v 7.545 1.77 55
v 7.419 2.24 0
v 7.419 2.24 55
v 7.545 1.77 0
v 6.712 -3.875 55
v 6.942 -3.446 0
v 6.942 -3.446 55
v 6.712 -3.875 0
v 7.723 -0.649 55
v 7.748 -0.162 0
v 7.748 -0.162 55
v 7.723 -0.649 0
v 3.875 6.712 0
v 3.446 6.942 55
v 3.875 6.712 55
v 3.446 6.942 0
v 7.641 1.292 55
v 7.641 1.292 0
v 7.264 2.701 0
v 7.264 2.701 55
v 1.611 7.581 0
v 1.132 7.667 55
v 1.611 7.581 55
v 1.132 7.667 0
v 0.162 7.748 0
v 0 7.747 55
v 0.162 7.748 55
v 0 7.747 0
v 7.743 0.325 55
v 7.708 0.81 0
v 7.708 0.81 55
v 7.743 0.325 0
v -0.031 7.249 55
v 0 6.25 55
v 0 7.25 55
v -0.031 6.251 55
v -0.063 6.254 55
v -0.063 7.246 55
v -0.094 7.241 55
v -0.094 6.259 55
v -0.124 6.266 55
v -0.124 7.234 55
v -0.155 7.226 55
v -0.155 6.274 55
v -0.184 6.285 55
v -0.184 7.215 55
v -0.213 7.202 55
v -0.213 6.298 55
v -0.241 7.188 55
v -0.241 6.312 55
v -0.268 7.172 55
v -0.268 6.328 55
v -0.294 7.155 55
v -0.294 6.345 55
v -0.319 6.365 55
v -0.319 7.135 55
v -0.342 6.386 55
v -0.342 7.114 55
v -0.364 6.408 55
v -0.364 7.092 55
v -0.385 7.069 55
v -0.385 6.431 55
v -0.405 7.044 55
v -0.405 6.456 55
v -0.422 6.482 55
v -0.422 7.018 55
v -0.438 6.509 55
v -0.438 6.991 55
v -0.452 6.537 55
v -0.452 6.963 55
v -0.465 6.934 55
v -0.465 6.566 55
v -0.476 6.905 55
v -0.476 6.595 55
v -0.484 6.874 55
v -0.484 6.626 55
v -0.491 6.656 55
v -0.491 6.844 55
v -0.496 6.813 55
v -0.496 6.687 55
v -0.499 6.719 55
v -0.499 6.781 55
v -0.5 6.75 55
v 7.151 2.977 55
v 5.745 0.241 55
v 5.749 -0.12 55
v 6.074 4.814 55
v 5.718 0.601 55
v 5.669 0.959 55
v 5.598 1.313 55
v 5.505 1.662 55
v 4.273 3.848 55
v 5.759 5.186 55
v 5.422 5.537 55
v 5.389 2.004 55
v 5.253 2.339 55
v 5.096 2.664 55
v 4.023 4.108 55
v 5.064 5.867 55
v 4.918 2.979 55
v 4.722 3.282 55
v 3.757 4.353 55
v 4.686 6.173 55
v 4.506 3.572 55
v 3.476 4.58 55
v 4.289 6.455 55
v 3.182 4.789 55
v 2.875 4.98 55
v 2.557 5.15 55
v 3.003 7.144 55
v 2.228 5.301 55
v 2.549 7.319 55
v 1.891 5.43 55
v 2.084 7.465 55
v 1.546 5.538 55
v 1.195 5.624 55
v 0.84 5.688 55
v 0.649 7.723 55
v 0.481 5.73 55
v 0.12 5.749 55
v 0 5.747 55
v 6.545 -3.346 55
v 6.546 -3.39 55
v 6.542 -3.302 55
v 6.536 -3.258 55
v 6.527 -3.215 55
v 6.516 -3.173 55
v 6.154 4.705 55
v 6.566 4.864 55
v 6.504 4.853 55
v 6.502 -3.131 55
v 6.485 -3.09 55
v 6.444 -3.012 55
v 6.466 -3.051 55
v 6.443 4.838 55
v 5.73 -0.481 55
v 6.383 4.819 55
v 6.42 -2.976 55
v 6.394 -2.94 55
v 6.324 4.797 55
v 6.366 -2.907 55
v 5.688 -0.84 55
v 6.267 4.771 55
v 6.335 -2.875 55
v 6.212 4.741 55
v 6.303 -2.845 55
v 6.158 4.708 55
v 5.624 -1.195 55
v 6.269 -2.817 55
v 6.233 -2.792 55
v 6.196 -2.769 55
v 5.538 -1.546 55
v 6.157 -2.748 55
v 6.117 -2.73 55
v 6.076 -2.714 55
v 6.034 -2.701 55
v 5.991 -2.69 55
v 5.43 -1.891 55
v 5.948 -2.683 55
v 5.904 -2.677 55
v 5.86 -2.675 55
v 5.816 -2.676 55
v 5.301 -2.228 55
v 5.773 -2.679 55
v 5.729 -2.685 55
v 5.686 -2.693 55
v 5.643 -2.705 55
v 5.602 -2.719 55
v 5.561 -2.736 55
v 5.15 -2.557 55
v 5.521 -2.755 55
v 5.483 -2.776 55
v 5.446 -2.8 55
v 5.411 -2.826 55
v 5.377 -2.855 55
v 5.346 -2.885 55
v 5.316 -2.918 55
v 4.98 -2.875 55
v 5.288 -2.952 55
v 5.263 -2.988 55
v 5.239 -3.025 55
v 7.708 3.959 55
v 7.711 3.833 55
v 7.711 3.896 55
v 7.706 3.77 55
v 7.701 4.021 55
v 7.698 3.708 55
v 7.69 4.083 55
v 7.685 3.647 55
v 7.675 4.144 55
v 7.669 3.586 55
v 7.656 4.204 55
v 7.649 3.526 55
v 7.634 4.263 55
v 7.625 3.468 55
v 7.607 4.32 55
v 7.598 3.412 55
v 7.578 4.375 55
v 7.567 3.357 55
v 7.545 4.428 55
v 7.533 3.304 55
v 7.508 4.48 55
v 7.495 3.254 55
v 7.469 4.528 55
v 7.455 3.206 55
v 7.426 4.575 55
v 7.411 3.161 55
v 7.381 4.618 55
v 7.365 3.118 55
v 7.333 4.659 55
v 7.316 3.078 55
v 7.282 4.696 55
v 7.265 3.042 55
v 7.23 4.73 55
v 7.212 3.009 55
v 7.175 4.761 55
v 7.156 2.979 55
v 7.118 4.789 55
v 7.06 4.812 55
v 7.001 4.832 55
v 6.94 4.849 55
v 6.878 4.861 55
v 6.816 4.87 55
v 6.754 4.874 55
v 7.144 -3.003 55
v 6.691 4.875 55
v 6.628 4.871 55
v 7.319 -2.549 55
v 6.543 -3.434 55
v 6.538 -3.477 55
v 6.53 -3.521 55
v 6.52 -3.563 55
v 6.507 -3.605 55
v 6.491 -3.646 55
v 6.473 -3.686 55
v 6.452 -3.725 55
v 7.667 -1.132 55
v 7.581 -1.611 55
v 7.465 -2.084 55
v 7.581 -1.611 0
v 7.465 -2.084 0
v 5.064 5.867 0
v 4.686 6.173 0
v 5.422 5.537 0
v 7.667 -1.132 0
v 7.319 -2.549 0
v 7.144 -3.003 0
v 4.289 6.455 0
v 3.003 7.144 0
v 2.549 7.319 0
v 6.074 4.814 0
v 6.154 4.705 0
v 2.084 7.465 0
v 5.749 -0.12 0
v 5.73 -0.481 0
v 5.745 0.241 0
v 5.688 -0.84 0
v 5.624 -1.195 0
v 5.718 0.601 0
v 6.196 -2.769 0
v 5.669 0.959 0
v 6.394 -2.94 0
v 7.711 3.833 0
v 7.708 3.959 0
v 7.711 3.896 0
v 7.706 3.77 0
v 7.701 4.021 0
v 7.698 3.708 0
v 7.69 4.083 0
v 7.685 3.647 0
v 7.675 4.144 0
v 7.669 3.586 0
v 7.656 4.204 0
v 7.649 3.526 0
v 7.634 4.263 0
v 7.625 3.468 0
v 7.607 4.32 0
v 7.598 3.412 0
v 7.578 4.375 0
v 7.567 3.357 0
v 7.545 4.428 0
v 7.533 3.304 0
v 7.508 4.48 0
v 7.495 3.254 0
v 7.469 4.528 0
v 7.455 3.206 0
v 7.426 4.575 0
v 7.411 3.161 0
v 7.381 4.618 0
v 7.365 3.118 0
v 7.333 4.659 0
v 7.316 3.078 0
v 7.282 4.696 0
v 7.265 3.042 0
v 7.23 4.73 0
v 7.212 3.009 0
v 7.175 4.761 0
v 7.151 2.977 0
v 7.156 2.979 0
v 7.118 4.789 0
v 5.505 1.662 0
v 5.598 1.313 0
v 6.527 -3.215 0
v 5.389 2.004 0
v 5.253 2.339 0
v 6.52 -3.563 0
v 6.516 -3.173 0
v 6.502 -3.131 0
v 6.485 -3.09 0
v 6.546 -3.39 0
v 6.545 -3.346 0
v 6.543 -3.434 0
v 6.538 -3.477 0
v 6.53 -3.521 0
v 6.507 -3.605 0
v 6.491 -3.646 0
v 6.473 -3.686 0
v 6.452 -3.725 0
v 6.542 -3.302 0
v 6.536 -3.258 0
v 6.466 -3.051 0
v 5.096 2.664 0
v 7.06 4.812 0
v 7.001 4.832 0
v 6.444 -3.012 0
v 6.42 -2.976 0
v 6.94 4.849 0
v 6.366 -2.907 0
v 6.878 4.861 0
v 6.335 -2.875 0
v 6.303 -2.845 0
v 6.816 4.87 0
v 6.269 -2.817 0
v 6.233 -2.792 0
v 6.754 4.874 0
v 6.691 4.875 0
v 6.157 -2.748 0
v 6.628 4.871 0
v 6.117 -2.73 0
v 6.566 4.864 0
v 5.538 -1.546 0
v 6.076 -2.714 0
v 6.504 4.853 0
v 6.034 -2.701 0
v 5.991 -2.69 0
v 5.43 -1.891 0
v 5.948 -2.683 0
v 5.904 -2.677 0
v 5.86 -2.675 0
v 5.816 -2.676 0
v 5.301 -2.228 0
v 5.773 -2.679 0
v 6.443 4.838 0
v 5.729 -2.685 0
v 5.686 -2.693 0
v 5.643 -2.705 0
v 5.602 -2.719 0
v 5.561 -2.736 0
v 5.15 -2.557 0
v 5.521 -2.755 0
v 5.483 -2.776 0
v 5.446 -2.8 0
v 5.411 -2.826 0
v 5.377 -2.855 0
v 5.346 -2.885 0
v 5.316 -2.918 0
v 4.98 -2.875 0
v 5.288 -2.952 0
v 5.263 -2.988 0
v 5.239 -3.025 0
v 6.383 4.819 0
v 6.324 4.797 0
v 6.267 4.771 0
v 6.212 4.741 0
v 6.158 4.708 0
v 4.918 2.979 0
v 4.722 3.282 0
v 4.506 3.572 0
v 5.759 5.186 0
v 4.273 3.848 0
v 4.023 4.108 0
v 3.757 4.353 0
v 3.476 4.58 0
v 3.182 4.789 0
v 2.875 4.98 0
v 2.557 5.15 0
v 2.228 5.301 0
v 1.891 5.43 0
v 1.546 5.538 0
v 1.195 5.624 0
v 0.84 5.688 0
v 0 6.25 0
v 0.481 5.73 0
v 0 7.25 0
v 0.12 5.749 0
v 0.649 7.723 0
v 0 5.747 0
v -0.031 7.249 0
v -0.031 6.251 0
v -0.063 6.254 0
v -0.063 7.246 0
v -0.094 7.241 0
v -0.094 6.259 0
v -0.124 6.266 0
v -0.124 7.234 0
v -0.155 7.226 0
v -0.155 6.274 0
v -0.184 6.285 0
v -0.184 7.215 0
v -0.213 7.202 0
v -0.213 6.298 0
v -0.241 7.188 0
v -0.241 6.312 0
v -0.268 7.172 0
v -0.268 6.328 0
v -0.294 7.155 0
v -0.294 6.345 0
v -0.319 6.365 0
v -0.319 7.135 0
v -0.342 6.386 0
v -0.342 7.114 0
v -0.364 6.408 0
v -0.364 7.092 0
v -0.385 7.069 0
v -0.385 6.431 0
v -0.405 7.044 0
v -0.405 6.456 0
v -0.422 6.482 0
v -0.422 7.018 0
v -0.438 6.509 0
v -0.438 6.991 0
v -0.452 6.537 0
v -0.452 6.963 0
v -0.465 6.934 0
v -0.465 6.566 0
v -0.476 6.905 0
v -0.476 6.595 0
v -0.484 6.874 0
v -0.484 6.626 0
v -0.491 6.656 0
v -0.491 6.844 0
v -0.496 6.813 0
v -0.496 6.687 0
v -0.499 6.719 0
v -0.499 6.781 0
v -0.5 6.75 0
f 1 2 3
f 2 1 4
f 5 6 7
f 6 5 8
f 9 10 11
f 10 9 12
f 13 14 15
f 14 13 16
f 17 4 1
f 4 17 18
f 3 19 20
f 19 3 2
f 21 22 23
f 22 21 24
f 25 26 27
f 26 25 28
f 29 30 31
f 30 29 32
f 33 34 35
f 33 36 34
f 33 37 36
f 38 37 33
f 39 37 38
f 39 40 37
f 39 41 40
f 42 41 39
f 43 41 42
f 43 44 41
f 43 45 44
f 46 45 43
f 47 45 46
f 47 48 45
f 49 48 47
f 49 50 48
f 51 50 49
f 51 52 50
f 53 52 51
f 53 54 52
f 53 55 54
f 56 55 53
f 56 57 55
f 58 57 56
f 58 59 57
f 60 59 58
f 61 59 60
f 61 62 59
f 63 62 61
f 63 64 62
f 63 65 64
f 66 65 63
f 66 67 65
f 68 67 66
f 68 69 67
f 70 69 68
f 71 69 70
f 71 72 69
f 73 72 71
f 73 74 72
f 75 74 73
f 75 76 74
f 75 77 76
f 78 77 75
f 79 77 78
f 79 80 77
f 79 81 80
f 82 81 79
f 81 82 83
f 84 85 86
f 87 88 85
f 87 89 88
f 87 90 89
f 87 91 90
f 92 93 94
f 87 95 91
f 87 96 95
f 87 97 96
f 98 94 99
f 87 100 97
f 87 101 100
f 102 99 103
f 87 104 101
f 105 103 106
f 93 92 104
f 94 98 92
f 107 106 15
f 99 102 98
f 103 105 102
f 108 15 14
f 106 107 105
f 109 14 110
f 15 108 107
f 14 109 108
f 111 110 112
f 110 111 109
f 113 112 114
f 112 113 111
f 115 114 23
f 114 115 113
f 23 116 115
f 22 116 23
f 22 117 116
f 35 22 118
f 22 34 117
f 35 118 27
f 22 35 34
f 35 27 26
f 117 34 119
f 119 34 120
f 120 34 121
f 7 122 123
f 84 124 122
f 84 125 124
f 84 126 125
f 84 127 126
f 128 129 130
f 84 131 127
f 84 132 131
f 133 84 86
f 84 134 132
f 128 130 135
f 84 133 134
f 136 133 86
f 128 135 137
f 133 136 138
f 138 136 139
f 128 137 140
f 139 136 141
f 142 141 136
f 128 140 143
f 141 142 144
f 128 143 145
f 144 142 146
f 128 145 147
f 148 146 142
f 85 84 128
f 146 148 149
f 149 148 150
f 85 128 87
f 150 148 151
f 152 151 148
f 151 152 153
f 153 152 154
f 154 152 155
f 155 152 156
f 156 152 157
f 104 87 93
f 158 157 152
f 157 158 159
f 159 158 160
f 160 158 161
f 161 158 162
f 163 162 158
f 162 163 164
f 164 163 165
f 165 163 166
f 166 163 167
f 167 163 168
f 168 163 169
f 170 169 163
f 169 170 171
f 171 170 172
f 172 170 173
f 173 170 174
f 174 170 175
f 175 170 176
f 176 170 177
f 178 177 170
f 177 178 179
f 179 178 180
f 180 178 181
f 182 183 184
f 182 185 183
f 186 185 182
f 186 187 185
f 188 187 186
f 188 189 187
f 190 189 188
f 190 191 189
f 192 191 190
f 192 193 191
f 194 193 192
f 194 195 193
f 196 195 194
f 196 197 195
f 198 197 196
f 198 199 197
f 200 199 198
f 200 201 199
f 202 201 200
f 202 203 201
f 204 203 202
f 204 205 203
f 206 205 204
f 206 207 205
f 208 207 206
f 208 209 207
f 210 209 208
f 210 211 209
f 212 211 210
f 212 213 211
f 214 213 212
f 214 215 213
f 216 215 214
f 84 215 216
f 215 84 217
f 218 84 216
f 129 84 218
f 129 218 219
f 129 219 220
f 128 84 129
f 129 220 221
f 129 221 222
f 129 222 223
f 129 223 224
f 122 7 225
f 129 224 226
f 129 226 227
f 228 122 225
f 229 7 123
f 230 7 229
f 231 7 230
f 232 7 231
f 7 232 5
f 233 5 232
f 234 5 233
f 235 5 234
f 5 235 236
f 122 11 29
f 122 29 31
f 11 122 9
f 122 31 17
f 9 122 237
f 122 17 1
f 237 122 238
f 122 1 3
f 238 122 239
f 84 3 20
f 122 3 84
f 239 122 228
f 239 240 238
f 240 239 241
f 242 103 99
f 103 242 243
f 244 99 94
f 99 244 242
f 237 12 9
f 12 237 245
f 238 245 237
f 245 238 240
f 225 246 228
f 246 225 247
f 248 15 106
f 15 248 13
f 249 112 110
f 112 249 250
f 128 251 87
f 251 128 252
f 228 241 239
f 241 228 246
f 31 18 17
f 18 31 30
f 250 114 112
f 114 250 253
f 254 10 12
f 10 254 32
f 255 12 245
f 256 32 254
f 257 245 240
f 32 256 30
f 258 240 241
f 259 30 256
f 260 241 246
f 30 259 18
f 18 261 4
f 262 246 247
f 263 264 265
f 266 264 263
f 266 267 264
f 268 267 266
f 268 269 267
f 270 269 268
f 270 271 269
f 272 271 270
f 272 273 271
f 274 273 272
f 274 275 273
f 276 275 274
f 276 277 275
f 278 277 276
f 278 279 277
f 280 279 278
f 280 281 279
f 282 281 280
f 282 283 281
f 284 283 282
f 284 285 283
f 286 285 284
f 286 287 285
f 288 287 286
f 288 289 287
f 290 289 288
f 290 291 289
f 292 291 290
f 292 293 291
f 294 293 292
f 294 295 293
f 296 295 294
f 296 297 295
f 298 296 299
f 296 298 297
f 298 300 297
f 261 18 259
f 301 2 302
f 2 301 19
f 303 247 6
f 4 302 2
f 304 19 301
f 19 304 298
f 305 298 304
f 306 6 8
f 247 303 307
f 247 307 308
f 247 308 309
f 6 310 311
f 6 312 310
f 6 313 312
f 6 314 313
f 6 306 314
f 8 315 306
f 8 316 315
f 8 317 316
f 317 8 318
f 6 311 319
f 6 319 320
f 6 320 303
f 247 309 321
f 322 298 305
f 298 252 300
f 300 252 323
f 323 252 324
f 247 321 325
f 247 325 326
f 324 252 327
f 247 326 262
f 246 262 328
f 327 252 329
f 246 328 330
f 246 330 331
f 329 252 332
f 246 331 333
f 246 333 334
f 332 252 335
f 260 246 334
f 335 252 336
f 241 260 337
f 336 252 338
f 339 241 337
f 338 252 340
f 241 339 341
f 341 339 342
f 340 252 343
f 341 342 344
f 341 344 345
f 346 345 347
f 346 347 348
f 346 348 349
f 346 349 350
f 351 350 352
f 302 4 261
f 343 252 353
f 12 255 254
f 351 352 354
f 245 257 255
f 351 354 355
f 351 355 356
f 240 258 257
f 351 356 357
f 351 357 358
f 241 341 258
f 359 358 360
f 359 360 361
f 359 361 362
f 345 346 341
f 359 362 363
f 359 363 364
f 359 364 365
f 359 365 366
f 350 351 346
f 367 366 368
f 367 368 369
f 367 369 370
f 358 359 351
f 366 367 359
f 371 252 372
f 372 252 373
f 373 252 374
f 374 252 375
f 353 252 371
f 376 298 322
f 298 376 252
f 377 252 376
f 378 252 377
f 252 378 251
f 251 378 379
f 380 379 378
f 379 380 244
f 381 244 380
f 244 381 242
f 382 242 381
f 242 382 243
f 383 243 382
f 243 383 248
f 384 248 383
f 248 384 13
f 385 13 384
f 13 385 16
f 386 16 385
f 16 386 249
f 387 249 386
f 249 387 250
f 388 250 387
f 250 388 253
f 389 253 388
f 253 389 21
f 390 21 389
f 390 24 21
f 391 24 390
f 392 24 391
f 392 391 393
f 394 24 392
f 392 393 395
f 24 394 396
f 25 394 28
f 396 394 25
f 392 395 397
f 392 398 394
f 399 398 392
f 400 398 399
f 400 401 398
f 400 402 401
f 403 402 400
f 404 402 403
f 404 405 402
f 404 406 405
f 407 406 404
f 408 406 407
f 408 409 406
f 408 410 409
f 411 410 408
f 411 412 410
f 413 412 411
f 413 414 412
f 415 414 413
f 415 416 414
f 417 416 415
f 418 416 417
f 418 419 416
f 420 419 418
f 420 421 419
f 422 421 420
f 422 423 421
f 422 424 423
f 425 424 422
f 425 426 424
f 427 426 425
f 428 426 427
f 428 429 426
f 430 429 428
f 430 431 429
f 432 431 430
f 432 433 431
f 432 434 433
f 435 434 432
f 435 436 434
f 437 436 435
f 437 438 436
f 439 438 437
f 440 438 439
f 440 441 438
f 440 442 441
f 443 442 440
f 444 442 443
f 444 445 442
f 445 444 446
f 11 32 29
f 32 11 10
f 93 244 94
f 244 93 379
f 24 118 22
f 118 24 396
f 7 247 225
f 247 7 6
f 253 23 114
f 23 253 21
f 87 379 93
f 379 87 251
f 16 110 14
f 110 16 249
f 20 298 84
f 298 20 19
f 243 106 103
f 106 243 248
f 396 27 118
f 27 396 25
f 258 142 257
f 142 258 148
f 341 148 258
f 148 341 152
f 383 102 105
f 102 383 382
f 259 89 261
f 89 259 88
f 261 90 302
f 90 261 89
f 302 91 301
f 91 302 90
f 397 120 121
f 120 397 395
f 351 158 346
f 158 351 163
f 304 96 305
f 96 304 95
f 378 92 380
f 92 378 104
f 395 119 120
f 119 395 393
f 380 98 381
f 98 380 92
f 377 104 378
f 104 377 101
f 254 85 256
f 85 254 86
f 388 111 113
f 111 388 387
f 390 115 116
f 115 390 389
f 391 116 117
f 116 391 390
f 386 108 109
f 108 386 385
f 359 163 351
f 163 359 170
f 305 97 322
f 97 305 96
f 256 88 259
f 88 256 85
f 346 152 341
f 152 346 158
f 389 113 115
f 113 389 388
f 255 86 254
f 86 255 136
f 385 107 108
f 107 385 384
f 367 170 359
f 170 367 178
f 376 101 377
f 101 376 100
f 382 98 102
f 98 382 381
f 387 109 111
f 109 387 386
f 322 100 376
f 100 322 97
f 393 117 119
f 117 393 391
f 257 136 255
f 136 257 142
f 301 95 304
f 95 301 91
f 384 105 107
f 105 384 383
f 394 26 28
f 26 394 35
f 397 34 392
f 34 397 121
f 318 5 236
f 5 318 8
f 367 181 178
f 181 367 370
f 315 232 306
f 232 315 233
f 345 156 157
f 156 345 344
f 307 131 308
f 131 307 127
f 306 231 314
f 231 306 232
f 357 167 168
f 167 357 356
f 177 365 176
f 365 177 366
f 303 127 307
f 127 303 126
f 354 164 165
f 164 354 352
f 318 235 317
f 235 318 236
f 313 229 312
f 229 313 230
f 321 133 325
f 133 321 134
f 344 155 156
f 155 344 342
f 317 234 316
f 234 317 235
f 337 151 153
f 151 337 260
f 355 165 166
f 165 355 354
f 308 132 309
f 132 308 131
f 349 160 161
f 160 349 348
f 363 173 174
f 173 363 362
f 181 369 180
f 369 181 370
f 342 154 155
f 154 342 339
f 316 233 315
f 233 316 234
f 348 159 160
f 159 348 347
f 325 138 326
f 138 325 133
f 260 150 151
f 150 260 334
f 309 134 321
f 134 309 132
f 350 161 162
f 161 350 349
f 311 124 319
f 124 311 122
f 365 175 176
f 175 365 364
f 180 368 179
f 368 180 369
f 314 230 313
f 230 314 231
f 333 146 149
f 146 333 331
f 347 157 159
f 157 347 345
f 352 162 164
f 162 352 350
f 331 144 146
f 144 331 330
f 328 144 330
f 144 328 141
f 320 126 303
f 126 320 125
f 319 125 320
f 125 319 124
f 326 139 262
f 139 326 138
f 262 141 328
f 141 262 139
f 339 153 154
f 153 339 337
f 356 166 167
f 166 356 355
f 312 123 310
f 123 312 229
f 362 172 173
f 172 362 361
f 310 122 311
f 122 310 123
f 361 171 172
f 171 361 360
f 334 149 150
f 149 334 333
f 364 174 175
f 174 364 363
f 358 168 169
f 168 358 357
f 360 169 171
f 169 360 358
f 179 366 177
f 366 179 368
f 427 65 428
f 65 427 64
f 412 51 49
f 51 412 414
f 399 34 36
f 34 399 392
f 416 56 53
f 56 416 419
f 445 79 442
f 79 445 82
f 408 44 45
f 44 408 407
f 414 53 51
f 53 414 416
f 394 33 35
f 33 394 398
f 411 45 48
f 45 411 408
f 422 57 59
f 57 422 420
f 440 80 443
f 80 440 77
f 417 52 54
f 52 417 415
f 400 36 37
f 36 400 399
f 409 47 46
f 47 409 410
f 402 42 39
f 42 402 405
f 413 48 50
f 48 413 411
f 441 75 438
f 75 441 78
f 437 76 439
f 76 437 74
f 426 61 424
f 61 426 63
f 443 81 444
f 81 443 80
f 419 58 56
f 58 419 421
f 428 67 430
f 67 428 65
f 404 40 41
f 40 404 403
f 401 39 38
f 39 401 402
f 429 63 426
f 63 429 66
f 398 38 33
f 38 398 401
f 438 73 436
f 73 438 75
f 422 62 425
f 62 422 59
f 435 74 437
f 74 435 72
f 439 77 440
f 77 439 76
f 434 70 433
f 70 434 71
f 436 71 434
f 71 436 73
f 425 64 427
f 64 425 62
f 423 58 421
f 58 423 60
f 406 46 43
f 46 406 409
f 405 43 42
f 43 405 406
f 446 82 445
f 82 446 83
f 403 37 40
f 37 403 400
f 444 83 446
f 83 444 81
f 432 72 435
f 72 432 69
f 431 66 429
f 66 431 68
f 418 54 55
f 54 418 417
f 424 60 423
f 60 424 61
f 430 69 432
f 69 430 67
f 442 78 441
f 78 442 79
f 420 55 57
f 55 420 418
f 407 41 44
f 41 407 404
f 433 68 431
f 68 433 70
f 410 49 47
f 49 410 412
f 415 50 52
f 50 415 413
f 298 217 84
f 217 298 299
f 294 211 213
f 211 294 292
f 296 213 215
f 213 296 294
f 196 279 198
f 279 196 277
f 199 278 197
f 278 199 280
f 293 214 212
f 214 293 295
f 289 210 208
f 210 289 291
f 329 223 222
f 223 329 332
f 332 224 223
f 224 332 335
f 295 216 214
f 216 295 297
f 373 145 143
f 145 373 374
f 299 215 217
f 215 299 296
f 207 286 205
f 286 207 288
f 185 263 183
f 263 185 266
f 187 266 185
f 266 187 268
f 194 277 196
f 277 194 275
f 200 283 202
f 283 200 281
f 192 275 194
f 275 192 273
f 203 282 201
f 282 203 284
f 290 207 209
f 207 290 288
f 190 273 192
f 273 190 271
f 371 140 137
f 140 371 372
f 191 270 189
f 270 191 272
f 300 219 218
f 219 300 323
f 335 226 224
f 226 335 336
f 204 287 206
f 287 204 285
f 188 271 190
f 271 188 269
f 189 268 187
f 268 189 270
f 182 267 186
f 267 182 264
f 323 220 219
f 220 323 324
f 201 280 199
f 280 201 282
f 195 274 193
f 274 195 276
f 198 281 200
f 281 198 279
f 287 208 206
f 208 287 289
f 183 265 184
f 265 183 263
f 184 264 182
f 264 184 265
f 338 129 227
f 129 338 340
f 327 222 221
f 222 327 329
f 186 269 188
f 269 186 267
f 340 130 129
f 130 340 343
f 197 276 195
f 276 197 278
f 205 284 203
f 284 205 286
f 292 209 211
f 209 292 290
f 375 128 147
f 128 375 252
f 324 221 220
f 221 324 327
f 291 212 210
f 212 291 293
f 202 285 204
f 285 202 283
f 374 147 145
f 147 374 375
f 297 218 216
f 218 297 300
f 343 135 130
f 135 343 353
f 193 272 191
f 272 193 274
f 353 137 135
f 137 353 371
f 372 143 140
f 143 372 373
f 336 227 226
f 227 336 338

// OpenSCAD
// PARAMETRES

// MODULE
rayon_module = 5.75;
hauteur = 50+5;
rayon_chambre = 0.75;
rayon_canule = 0.75;
rayon_lumen = 2.25;
dec = 6; // longueur d'un coté du triangle équilatéral
//dec_y = rayon_module/6;
e = 3.5; //écartement entre deux paires de trous

// MOULE
e_mold = 2; // epaisseur du moule en mm
mold_radius = rayon_module + e_mold;
mold_canula = 0.5; // pour coincer les pièces entre elles (rayon)
mold_support = 1; // pour coincer le moule dans le support (rayon)

marge = 0.2; // écart en mm du rayon des pièces pour qu'elles puissent s'imbriquer entre elles
// ajout des marges sur les trous pour l'instant

$fn = 100; // permet de déterminer le nb de face, et donc la résolution des surfaces arrondies !

dec_x = dec*sin(60);  // décalage appliqués pour qu'ils soient bien placé en triangle
dec_y = dec*cos(60);

A_x = dec_x;
A_y = 0;

B_x = 0;
B_y = dec_y;

C_x = 0;
C_y = -dec_y;

A1_x = A_x;
A2_x = A_x;
A1_y = A_y - e/2;
A2_y = A_y + e/2;

B1_x = B_x - (e/2)*sin(60);
B2_x = B_x + (e/2)*sin(60);
B1_y = B_y - (e/2)*cos(60);
B2_y = B_y + (e/2)*cos(60);

C1_x = C_x + (e/2)*sin(60);
C2_x = C_x - (e/2)*sin(60);
C1_y = C_y - (e/2)*cos(60);
C2_y = C_y + (e/2)*cos(60);


// determine la valeur de la translation appliqué de bas à tous les trous
t_x = -(dec/2)*tan(30); // décalage pour centrer le triangle dans le cercle
t_y = 0;
t_z = 1;

t_z_l = -1; // translation initiale du lumen

// FIN DES PARAME7TRES

//cylinder(hauteur, rayon_module, rayon_module); // Crée la forme générale du robot



/*
translate([0,mold_radius-e_mold/2,0]){
cylinder(hauteur,mold_canula,mold_canula);
}*/



//rotate([0,0,0]){ // pour le 1er # 003
//rotate([0,0,120]){ // pour le 2nd # 003
rotate([0,0,240]){ // pour le 2nd # 003

union(){ // #002

difference(){ // #001

intersection(){

difference(){
    cylinder(hauteur, mold_radius, mold_radius);
    translate([0,0,t_z_l]){
cylinder(hauteur+2, rayon_module, rayon_module); // Crée la forme //générale du robot
    }
} // Cree le moule cylindrique, avant découpage // difference
;

// rotate([0,0,0]){// rien pour le 1er # jamais utilisé mtn #444
//rotate([0,0,120]){ // pour le 2nd
//rotate([0,0,240]){ // pour le 2nd
union(){
rotate([0,0,120]) cube([hauteur/3,hauteur/3,hauteur]);
rotate([0,0,90]) cube([hauteur/3,hauteur/3,hauteur]);
}
// } // #444
};// intersection

translate([0,mold_radius-e_mold/2,t_z_l]){
cylinder(hauteur+2,mold_canula+marge,mold_canula+marge);
} // canule soustraite

} // difference #001

rotate([0,0,120]){
translate([0,mold_radius-e_mold/2,0]){
cylinder(hauteur,mold_canula,mold_canula);
}
} // canule ajoutée 

rotate([0,0,60]){
translate([0,mold_radius,0]){
cylinder(hauteur,mold_support,mold_support);
}
} // cannule pour le support

} // #002

}; // #003
/*
translate([0,mold_radius-e_mold/2,0]){
cylinder(hauteur,mold_canula,mold_canula);
}
*/
